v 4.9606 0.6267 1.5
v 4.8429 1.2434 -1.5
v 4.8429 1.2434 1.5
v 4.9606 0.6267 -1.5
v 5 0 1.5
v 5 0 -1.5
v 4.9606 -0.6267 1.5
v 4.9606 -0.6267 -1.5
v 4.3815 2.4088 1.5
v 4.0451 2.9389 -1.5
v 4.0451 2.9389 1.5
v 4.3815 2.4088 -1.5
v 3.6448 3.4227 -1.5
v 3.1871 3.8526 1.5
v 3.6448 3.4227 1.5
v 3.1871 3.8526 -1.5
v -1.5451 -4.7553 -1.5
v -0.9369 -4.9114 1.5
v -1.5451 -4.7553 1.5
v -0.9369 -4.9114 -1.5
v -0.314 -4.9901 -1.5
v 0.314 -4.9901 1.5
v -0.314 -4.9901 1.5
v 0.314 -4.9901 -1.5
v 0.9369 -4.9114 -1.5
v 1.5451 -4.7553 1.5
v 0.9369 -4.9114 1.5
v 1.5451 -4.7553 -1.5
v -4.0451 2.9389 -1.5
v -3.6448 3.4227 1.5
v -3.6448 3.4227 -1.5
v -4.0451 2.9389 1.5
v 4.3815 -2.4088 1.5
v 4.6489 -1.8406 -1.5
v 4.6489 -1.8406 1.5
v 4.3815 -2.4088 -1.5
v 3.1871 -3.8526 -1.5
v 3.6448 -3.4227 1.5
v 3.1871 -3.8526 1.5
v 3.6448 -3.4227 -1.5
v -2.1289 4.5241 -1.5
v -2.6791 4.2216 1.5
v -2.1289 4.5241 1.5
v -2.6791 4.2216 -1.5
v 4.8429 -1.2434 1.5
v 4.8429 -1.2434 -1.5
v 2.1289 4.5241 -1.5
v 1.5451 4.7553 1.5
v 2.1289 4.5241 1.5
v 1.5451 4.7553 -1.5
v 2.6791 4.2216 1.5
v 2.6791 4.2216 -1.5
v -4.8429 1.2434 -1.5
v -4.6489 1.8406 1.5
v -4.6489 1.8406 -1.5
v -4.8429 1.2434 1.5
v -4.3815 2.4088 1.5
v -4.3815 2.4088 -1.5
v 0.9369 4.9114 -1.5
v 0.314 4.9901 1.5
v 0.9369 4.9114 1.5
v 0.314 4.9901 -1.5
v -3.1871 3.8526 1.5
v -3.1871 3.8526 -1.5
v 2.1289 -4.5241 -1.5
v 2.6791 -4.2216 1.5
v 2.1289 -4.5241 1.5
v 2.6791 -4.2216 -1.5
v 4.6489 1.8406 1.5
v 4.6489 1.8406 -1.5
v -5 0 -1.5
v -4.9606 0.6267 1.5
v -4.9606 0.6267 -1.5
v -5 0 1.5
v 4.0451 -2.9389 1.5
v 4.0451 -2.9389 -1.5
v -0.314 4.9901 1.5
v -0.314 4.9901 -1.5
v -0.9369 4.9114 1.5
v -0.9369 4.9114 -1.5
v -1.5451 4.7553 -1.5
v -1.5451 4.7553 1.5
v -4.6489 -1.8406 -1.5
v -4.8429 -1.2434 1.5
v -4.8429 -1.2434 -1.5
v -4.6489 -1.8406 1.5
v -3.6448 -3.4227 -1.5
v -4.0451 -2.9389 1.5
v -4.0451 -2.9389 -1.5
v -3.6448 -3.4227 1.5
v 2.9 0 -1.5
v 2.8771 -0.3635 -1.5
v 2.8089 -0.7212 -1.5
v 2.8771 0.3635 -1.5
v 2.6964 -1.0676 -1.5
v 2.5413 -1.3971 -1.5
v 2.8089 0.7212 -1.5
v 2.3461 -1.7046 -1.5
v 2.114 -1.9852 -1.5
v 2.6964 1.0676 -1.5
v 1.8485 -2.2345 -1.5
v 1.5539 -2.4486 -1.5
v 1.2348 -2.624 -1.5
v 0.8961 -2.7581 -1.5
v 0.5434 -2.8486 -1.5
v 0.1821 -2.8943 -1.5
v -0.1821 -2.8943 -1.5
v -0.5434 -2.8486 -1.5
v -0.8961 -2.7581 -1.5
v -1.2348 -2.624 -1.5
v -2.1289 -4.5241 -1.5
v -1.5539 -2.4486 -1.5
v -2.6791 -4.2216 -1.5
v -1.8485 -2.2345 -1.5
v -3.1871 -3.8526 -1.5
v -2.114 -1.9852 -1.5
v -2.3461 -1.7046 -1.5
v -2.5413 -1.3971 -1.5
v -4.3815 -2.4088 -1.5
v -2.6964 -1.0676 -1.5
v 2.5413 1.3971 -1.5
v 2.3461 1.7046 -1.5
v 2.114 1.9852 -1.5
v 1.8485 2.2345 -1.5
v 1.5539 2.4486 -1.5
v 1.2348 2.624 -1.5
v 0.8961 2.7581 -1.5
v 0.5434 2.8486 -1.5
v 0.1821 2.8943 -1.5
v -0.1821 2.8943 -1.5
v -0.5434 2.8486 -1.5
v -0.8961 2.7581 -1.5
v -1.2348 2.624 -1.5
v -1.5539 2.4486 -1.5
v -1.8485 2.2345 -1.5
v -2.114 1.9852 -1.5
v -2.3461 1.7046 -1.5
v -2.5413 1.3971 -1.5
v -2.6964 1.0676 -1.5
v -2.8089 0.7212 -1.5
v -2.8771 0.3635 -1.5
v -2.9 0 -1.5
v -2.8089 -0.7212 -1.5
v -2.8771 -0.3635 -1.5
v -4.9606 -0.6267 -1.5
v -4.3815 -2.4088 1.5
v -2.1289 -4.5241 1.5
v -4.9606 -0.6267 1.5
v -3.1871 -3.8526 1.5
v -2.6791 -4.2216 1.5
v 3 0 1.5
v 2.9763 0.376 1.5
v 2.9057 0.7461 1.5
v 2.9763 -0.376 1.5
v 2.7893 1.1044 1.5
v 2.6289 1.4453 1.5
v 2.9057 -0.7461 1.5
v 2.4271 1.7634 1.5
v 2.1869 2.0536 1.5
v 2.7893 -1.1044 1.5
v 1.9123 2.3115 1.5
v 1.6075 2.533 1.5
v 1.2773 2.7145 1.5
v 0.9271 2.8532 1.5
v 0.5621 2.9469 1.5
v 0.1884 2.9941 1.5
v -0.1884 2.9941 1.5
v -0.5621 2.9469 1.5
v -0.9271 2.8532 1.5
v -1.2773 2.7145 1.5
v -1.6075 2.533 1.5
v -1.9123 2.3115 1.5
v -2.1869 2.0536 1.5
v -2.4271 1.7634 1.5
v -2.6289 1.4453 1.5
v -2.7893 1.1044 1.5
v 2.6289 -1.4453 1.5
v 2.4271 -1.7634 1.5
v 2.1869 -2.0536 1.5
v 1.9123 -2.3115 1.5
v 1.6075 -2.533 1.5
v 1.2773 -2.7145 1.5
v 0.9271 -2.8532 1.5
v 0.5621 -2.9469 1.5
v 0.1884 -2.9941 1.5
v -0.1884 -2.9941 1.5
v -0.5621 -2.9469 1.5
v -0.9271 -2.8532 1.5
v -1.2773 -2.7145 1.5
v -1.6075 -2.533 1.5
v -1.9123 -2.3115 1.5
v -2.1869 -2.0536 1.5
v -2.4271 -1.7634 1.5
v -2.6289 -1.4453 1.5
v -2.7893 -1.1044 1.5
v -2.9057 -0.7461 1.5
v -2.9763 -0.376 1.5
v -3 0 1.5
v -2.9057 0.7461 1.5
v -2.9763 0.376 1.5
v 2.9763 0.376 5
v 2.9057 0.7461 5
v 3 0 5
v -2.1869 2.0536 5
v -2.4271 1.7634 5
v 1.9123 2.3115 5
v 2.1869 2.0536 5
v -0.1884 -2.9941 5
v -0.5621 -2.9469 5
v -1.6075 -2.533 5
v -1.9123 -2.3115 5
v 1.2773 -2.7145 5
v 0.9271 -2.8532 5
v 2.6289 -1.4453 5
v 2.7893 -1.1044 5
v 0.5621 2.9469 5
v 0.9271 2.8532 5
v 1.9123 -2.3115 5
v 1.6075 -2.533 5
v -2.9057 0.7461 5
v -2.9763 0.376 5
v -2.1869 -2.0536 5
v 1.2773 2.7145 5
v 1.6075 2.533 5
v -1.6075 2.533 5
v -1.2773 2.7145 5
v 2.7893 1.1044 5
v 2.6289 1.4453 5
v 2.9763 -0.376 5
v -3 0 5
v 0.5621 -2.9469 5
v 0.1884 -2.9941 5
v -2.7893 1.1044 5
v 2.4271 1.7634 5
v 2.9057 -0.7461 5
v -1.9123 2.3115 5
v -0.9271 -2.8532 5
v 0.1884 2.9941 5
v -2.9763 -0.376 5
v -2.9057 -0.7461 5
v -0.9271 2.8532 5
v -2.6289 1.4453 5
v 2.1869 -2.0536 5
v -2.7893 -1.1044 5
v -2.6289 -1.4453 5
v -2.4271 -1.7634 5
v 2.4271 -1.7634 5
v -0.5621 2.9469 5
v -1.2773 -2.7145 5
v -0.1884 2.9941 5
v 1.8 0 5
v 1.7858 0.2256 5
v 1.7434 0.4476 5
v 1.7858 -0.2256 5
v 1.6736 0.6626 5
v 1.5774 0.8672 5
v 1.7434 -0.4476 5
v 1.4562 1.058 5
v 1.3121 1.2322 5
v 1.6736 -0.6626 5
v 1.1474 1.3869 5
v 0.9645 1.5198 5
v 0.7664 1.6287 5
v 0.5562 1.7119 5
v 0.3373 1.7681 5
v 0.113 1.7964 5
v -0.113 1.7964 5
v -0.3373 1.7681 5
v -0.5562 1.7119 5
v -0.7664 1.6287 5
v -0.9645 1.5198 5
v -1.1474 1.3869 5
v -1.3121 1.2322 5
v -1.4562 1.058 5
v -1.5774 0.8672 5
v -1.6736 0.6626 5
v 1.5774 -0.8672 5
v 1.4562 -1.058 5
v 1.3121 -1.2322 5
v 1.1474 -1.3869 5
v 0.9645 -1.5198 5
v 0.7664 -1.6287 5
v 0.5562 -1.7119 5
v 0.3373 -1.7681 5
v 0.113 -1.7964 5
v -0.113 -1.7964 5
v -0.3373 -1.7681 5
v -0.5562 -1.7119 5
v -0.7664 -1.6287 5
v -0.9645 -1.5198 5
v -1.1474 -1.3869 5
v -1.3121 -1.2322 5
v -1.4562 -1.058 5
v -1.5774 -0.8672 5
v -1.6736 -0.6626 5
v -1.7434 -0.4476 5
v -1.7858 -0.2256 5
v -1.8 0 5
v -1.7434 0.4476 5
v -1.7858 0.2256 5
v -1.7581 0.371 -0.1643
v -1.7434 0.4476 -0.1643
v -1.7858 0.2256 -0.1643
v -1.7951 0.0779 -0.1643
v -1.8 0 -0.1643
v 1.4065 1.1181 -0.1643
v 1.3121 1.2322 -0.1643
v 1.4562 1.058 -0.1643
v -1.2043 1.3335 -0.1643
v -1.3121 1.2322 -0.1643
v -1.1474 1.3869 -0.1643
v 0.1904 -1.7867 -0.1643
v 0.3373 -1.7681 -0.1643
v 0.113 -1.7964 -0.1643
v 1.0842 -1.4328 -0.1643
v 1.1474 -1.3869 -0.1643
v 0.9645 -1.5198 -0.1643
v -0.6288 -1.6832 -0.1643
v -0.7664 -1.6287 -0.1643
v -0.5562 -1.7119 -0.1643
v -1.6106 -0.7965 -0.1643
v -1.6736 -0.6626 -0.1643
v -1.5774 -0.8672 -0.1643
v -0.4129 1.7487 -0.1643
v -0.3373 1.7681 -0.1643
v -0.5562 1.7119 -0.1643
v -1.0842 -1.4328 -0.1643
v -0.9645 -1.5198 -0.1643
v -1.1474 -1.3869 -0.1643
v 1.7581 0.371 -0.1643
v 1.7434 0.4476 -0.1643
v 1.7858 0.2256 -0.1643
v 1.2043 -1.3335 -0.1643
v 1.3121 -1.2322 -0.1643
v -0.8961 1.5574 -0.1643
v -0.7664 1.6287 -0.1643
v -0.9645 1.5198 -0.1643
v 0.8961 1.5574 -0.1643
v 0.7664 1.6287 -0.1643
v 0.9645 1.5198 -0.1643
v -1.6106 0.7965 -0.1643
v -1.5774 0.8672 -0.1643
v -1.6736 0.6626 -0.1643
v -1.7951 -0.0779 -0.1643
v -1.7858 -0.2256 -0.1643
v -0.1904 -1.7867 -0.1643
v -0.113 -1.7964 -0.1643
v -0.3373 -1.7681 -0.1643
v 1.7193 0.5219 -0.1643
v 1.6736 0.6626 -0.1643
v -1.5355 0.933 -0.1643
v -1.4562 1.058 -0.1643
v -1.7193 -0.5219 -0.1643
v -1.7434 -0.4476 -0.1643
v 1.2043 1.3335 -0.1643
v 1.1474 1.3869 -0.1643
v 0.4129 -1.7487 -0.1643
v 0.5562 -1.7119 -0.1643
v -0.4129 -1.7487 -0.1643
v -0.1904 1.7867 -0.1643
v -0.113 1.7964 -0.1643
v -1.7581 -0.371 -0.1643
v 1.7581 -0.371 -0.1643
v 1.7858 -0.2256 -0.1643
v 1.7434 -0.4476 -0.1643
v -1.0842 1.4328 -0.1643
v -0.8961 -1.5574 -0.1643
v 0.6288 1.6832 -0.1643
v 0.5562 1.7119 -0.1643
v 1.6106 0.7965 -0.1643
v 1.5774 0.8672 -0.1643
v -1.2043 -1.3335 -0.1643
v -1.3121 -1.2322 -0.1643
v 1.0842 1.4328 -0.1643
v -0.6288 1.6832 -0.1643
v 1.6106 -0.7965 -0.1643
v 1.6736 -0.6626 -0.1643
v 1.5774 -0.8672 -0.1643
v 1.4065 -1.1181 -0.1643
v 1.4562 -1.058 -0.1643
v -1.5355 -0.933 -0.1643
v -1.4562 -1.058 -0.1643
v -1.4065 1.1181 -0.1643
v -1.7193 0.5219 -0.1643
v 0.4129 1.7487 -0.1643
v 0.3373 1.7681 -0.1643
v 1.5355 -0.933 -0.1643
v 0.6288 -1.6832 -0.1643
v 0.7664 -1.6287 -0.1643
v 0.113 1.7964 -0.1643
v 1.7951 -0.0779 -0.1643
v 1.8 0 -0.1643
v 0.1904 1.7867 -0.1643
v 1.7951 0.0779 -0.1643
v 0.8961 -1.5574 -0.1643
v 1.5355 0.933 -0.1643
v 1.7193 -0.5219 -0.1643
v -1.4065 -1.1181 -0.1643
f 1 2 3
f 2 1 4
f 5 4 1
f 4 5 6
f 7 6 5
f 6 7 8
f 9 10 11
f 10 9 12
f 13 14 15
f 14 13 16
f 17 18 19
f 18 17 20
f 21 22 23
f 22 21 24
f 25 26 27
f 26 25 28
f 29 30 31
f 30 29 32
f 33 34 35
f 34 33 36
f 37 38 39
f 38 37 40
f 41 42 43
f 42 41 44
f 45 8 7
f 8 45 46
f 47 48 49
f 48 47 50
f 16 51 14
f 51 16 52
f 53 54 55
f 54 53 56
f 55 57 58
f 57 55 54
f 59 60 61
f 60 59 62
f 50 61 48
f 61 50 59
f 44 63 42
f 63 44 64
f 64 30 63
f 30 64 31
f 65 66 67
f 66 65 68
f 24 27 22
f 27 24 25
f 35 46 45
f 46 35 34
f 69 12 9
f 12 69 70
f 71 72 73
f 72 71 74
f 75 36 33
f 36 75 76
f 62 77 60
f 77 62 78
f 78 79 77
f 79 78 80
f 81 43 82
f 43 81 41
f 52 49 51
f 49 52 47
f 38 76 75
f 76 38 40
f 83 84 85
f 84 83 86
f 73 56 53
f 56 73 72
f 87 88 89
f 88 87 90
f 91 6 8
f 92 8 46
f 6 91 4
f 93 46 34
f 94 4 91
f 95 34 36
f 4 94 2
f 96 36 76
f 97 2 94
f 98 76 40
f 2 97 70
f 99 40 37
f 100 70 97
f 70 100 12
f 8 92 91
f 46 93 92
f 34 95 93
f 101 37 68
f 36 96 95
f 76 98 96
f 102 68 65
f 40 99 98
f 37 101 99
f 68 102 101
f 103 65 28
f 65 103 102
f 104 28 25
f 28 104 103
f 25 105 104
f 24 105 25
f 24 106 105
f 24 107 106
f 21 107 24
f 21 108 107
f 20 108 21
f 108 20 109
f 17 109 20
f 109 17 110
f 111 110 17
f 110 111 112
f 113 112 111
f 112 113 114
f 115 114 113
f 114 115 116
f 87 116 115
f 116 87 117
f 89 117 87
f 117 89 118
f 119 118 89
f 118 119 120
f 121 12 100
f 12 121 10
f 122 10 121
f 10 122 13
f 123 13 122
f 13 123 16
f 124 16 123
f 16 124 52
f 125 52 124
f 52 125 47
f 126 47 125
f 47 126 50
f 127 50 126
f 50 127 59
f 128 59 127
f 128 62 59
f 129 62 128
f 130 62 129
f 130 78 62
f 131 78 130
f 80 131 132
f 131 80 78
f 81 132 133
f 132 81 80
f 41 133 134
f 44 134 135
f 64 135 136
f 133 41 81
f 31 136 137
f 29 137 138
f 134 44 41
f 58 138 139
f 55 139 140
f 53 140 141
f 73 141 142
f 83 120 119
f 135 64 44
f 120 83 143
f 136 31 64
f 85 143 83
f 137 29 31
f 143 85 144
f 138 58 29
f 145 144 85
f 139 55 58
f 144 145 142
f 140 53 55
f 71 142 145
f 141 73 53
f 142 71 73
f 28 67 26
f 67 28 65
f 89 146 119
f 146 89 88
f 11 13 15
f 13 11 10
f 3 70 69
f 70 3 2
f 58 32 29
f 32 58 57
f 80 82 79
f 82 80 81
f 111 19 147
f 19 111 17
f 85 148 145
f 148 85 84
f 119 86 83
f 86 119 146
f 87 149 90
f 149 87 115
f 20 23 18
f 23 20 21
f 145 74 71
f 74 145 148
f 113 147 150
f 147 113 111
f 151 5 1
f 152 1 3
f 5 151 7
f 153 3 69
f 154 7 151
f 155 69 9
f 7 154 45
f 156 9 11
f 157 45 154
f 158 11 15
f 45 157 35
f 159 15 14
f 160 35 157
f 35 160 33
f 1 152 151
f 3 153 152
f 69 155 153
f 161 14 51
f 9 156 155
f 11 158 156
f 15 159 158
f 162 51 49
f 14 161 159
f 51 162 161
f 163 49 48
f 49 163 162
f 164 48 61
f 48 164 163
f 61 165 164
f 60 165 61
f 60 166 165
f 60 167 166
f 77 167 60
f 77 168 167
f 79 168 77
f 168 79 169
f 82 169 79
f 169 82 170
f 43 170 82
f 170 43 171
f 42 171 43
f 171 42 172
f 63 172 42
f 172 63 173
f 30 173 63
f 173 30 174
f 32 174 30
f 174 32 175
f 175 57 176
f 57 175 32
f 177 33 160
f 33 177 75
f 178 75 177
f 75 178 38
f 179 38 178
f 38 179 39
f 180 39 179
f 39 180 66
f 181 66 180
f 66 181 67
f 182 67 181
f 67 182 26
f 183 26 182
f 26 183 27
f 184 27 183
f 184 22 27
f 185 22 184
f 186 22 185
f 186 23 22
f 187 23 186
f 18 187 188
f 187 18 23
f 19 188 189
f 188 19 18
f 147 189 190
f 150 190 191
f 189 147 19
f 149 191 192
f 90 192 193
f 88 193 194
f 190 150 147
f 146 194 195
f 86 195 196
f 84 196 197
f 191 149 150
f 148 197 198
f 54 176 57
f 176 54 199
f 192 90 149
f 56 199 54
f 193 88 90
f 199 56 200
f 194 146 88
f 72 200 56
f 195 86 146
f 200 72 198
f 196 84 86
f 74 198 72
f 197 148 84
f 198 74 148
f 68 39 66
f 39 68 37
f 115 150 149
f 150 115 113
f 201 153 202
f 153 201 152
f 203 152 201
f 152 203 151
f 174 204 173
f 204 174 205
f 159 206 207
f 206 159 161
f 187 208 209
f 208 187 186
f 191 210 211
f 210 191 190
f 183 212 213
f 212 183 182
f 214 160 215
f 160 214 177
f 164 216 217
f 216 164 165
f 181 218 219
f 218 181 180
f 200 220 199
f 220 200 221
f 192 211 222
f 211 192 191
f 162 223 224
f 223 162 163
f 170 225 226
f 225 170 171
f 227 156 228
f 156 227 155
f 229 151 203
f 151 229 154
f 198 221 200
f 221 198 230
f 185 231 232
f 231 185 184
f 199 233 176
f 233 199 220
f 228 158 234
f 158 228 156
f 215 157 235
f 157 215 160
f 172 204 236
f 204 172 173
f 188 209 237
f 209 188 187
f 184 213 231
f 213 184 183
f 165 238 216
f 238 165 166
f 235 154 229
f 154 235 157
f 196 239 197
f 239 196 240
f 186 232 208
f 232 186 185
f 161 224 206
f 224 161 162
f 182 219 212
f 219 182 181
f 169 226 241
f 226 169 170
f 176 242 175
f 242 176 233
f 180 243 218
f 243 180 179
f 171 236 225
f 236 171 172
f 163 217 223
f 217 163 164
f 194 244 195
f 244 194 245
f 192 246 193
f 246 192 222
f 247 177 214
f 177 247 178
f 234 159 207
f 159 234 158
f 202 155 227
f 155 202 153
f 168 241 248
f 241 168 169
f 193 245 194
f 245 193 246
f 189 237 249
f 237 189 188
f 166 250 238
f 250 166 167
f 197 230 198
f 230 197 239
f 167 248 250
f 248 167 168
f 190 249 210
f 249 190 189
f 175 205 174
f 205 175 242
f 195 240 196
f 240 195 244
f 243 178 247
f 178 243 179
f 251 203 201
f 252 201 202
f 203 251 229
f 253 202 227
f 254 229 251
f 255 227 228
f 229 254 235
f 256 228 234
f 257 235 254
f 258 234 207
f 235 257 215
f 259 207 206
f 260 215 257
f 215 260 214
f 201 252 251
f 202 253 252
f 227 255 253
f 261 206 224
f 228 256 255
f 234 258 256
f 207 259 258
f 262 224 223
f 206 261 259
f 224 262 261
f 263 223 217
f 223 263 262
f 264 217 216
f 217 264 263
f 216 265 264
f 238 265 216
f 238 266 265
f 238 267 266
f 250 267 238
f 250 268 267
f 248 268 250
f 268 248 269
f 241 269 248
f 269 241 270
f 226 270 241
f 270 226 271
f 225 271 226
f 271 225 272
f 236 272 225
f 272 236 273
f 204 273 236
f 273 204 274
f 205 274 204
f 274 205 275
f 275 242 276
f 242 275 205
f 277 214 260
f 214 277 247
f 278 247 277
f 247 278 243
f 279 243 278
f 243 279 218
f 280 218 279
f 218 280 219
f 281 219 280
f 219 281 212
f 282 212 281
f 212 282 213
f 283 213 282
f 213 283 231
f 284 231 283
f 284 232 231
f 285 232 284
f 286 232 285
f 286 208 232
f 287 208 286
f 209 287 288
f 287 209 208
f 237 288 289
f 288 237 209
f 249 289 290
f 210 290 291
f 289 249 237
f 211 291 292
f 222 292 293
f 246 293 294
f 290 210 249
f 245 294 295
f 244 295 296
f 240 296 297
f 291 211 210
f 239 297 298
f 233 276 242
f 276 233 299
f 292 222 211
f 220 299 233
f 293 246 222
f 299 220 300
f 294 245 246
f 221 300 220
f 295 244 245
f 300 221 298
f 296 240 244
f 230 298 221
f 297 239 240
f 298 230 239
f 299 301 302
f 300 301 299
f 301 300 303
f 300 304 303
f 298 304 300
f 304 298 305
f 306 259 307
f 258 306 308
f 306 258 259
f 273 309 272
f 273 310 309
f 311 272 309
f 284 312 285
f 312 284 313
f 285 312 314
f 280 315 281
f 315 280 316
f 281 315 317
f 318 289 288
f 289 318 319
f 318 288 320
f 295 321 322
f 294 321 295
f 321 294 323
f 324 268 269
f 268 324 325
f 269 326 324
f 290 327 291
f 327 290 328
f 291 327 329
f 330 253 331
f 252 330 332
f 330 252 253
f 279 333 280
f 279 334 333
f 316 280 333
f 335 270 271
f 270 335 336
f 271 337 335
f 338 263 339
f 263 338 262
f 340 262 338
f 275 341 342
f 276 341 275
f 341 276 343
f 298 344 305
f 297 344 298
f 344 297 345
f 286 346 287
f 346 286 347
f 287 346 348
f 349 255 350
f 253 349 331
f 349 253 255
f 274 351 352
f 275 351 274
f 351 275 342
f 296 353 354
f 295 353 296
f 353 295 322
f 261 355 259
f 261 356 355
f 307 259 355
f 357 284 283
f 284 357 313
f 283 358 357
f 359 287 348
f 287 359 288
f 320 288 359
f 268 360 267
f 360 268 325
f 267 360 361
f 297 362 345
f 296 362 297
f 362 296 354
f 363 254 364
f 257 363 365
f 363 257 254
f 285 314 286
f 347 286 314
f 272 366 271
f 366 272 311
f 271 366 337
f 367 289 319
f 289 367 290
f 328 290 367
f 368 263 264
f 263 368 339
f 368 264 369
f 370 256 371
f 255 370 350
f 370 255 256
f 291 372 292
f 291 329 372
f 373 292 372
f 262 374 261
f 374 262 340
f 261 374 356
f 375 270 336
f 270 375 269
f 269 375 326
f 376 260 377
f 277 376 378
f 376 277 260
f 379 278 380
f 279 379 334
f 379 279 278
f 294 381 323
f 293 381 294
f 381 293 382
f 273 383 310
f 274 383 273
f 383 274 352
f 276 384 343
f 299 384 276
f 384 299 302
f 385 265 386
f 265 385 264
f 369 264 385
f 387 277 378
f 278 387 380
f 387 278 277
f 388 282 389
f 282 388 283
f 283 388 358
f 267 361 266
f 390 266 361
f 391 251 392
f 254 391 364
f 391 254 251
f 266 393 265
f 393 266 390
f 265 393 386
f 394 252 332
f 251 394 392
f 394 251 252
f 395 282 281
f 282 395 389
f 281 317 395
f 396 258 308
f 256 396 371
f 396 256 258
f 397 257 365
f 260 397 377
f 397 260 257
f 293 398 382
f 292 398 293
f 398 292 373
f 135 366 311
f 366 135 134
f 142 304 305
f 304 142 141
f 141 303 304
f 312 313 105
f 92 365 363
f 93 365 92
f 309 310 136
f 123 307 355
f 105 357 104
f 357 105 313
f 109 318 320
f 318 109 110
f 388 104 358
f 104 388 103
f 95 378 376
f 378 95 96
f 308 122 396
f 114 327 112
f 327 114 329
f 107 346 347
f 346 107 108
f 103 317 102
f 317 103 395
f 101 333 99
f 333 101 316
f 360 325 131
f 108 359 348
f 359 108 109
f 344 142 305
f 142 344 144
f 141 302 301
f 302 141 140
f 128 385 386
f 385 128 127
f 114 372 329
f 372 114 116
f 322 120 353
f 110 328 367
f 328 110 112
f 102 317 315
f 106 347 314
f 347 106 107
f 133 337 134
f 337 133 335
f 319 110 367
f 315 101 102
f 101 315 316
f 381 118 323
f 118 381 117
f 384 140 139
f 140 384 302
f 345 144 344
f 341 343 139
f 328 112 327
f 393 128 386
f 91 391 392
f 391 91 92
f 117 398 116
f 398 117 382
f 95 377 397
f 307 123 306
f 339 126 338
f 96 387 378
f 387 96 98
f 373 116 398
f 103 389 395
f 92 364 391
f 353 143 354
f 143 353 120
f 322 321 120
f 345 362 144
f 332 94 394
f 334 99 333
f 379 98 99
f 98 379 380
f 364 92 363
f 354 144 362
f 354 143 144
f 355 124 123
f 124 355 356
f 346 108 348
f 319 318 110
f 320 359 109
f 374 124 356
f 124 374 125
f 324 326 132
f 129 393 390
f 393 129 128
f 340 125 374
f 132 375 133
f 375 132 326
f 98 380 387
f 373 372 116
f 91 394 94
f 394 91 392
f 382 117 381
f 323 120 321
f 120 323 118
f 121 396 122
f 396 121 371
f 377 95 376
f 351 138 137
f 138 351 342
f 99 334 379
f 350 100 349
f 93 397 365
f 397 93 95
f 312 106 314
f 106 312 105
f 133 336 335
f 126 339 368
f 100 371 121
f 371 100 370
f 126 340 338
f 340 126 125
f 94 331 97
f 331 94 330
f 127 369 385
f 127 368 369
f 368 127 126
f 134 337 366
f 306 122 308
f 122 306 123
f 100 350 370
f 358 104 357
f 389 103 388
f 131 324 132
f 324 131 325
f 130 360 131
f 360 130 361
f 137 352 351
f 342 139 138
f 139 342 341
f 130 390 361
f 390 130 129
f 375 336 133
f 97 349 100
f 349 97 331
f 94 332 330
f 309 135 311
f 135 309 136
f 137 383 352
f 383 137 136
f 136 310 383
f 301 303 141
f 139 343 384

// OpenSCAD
$fn = 50;


difference() {
	union() {
		translate(v = [0, 0, -1.5000000000]) {
			cylinder(h = 3, r = 5.0000000000);
		}
		translate(v = [0, 0, -1.5000000000]) {
			cylinder(h = 6.5000000000, r = 3.0000000000);
		}
	}
	union() {
		translate(v = [0, 0, -1.5000000000]) {
			rotate(a = [0, 180, 0]) {
				difference() {
					union() {
						translate(v = [0, 0, -6.5000000000]) {
							cylinder(h = 6.5000000000, r = 1.5000000000);
						}
						translate(v = [0, 0, -6.5000000000]) {
							cylinder(h = 6.5000000000, r = 1.8000000000);
						}
						translate(v = [0, 0, -1.7000000000]) {
							cylinder(h = 1.7000000000, r1 = 1.5000000000, r2 = 2.9000000000);
						}
						translate(v = [0, 0, -6.5000000000]) {
							cylinder(h = 6.5000000000, r = 1.5000000000);
						}
					}
					union();
				}
			}
		}
		translate(v = [0, 0, -100.0000000000]) {
			cylinder(h = 200, r = 1.5000000000);
		}
	}
}
